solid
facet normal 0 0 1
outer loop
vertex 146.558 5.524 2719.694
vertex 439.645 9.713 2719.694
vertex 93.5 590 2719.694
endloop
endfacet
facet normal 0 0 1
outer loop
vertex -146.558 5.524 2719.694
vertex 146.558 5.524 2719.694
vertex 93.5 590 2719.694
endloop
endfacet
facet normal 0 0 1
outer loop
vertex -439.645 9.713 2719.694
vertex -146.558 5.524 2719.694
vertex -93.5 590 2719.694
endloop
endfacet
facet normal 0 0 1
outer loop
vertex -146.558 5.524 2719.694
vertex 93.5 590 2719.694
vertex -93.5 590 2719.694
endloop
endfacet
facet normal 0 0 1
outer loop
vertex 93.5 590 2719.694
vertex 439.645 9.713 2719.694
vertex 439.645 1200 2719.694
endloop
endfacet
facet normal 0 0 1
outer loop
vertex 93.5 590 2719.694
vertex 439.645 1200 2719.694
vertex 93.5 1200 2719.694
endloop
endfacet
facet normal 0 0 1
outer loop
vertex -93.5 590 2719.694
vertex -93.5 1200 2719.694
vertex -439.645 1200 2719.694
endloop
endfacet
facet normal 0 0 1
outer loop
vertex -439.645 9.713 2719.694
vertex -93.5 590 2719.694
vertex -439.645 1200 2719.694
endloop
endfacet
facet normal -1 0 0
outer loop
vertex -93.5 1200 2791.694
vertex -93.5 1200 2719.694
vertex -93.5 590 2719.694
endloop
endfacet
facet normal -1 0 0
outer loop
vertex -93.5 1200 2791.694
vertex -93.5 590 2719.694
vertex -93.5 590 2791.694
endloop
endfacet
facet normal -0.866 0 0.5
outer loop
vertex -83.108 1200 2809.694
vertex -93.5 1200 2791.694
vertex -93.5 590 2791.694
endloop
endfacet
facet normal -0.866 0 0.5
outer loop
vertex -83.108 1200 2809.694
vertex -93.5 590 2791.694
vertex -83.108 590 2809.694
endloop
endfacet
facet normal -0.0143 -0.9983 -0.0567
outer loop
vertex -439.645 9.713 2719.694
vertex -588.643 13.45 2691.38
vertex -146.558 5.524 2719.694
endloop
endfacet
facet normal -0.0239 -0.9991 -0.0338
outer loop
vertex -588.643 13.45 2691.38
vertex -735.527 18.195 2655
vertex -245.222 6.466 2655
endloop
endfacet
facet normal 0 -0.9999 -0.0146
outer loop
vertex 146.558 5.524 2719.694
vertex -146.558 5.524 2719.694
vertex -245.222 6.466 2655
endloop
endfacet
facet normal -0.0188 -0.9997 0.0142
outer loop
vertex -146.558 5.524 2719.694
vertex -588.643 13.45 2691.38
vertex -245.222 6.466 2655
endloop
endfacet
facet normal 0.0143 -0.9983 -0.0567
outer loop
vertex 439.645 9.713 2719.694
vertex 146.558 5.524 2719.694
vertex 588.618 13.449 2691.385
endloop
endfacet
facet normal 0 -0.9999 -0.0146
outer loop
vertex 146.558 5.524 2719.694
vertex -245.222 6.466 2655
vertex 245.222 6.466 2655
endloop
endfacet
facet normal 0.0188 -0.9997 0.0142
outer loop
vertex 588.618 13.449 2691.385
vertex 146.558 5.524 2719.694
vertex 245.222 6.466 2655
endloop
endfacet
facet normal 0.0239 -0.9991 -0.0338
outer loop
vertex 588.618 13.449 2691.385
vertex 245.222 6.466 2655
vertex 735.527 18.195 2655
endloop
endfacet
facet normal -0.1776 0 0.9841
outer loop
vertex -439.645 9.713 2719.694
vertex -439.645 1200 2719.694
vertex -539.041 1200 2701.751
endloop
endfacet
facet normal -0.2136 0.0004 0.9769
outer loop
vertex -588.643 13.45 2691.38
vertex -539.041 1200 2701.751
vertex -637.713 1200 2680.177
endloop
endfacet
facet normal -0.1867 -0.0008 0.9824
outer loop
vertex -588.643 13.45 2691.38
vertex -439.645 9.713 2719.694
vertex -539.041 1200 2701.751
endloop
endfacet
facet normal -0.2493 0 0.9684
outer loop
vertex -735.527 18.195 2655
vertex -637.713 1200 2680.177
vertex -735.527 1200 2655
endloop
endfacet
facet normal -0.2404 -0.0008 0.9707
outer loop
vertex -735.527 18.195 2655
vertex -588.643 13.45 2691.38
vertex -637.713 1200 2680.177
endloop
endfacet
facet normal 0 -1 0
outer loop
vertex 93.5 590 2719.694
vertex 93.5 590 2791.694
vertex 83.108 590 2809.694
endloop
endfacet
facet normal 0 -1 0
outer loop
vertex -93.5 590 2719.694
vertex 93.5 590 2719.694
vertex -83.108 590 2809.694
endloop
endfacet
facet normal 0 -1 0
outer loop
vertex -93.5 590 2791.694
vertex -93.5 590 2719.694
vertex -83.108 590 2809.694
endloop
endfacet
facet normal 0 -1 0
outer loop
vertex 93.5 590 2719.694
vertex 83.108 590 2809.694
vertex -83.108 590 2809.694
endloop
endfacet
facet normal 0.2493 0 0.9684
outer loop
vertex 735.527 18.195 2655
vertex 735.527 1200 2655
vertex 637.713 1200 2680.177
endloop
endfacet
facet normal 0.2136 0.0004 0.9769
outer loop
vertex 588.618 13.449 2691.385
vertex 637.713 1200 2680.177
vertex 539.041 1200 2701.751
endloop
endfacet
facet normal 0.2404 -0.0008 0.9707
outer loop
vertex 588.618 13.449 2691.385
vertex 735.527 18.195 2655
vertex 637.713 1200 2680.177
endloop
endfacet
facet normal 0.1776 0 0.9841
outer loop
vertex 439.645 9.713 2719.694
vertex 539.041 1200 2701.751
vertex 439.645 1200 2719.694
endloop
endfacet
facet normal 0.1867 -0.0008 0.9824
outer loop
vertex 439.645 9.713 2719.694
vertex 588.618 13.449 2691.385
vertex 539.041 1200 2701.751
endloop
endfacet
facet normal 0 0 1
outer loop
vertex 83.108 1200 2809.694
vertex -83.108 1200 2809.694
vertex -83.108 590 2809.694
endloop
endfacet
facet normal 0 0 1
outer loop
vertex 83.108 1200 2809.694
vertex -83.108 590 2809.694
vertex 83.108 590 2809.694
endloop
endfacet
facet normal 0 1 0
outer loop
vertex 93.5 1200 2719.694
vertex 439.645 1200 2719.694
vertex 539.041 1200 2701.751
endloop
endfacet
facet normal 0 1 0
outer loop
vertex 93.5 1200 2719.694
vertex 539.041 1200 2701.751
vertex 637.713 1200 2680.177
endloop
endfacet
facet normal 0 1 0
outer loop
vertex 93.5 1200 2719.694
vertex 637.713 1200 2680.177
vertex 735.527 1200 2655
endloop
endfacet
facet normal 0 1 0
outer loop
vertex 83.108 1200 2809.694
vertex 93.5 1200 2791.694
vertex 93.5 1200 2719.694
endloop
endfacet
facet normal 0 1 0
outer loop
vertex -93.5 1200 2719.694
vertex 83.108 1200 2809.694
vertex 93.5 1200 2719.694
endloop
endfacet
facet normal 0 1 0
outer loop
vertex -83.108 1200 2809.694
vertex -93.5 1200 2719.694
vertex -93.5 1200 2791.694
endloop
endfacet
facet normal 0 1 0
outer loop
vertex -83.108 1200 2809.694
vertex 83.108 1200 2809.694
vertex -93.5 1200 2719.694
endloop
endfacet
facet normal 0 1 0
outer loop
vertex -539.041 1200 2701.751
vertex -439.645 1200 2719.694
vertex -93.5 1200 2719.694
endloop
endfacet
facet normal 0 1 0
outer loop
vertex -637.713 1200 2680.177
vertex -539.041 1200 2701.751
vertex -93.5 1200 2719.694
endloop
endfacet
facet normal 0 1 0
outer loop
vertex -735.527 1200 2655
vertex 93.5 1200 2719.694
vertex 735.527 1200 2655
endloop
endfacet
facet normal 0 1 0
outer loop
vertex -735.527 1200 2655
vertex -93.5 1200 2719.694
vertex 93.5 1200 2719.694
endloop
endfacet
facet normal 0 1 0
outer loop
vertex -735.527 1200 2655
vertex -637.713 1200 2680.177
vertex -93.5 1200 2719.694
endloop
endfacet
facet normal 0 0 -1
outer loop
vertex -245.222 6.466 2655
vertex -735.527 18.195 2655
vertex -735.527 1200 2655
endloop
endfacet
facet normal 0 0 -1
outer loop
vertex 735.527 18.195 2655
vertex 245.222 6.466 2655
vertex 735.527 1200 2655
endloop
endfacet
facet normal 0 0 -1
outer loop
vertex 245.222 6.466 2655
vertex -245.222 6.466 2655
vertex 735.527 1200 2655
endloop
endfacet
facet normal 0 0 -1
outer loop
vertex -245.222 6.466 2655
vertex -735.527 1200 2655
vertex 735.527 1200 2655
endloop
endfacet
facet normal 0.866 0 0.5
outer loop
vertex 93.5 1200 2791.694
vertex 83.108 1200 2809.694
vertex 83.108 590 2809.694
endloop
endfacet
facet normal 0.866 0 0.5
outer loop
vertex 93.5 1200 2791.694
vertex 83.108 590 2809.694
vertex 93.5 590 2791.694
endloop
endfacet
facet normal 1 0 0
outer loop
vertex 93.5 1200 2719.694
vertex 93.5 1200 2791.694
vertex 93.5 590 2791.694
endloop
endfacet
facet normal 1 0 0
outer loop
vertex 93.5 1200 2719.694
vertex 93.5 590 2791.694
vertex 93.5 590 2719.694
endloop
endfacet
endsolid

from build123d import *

# Parameters (mm, degrees)
F1_DEPTH  = 2000
F3_DEPTH  = 600.001
F6_DEPTH  = 1995.001
F8_DEPTH  = 1410
F10_DEPTH = 800
F12_DEPTH = 1995.001


with BuildPart() as f1:
    # F0 (on Front) → F1 (new body)
    with BuildSketch(Plane.XZ):
        with BuildLine():
            ThreePointArc((1355.2, 2268.467492), (1322.870911, 2382.422107), (1235.516548, 2462.422356))
            ThreePointArc((1235.516548, 2462.422356), (634.843055, 2680.85794), (0, 2755))
            ThreePointArc((0, 2755), (-634.843055, 2680.85794), (-1235.516548, 2462.422356))
            ThreePointArc((-1235.516548, 2462.422356), (-1322.870911, 2382.422107), (-1355.2, 2268.467492))
            Line((-1355.2, 2268.467492), (-1357.791007, 2155))
            Line((-1357.791007, 2155), (0, 2155))
            Line((0, 2155), (1357.791007, 2155))
            Line((1357.791007, 2155), (1355.2, 2268.467492))
        make_face()
    extrude(amount=-F1_DEPTH)

    # F2 (on face) → F3 (cut, through all)
    with BuildSketch(Plane(origin=(0, 0, 2155), x_dir=(1, 0, 0), z_dir=(0, 0, -1))):
        with BuildLine():
            ThreePointArc((-1357.791007, -50), (0, -5), (1357.791007, -50))
            Line((1357.791007, -50), (1357.791007, 0))
            Line((1357.791007, 0), (-1357.791007, 0))
            Line((-1357.791007, 0), (-1357.791007, -50))
        make_face()
    extrude(amount=-F3_DEPTH, mode=Mode.SUBTRACT)

    # F5 (on face) → F6 (cut, through all)
    with BuildSketch(Plane(origin=(0, 2000, 0), x_dir=(-1, 0, 0), z_dir=(0, 1, 0))):
        with BuildLine():
            Line((-439.645053, 2719.694326), (0, 2719.694326))
            Line((0, 2719.694326), (439.645053, 2719.694326))
            ThreePointArc((439.645053, 2719.694326), (220.530193, 2746.159397), (0, 2755))
            ThreePointArc((0, 2755), (-220.530193, 2746.159397), (-439.645053, 2719.694326))
        make_face()
    extrude(amount=-F6_DEPTH, mode=Mode.SUBTRACT)

    # F7 (on face) → F8 (join)
    with BuildSketch(Plane(origin=(0, 2000, 0), x_dir=(-1, 0, 0), z_dir=(0, 1, 0))):
        with BuildLine():
            ThreePointArc((-93.5, 2753.412928), (0, 2755), (93.5, 2753.412928))
            Line((93.5, 2753.412928), (93.5, 2791.694326))
            Line((93.5, 2791.694326), (83.107695, 2809.694326))
            Line((83.107695, 2809.694326), (0, 2809.694326))
            Line((0, 2809.694326), (-83.107695, 2809.694326))
            Line((-83.107695, 2809.694326), (-93.5, 2791.694326))
            Line((-93.5, 2791.694326), (-93.5, 2753.412928))
        make_face()
        with BuildLine():
            Line((-93.5, 2719.694326), (93.5, 2719.694326))
            Line((93.5, 2719.694326), (93.5, 2753.412928))
            ThreePointArc((93.5, 2753.412928), (0, 2755), (-93.5, 2753.412928))
            Line((-93.5, 2753.412928), (-93.5, 2719.694326))
        make_face()
    extrude(amount=-F8_DEPTH)

    # F9 (on face) → F10 (cut)
    with BuildSketch(Plane(origin=(0, 2000, 0), x_dir=(-1, 0, 0), z_dir=(0, 1, 0))):
        with BuildLine():
            ThreePointArc((1355.2, 2268.467492), (1322.870911, 2382.422107), (1235.516548, 2462.422356))
            ThreePointArc((1235.516548, 2462.422356), (847.401212, 2621.437809), (439.645053, 2719.694326))
            Line((439.645053, 2719.694326), (93.5, 2719.694326))
            Line((93.5, 2719.694326), (93.5, 2791.694326))
            Line((93.5, 2791.694326), (83.107695, 2809.694326))
            Line((83.107695, 2809.694326), (-83.107695, 2809.694326))
            Line((-83.107695, 2809.694326), (-93.5, 2791.694326))
            Line((-93.5, 2791.694326), (-93.5, 2719.694326))
            Line((-93.5, 2719.694326), (-439.645053, 2719.694326))
            ThreePointArc((-439.645053, 2719.694326), (-847.401212, 2621.437809), (-1235.516548, 2462.422356))
            ThreePointArc((-1235.516548, 2462.422356), (-1322.870911, 2382.422107), (-1355.2, 2268.467492))
            Line((-1355.2, 2268.467492), (-1357.791007, 2155))
            Line((-1357.791007, 2155), (1357.791007, 2155))
            Line((1357.791007, 2155), (1355.2, 2268.467492))
        make_face()
    extrude(amount=-F10_DEPTH, mode=Mode.SUBTRACT)

    # F11 (on face) → F12 (cut, through all)
    with BuildSketch(Plane(origin=(0, 2000, 0), x_dir=(-1, 0, 0), z_dir=(0, 1, 0))):
        with BuildLine():
            Line((735.527022, 2655), (-735.527022, 2655))
            ThreePointArc((-735.527022, 2655), (-990.214485, 2570.894839), (-1235.516548, 2462.422356))
            ThreePointArc((-1235.516548, 2462.422356), (-1322.870911, 2382.422107), (-1355.2, 2268.467492))
            Line((-1355.2, 2268.467492), (-1357.791007, 2155))
            Line((-1357.791007, 2155), (1357.791007, 2155))
            Line((1357.791007, 2155), (1355.2, 2268.467492))
            ThreePointArc((1355.2, 2268.467492), (1322.870911, 2382.422107), (1235.516548, 2462.422356))
            ThreePointArc((1235.516548, 2462.422356), (990.214485, 2570.894839), (735.527022, 2655))
        make_face()
    extrude(amount=-F12_DEPTH, mode=Mode.SUBTRACT)


solid = f1.part
